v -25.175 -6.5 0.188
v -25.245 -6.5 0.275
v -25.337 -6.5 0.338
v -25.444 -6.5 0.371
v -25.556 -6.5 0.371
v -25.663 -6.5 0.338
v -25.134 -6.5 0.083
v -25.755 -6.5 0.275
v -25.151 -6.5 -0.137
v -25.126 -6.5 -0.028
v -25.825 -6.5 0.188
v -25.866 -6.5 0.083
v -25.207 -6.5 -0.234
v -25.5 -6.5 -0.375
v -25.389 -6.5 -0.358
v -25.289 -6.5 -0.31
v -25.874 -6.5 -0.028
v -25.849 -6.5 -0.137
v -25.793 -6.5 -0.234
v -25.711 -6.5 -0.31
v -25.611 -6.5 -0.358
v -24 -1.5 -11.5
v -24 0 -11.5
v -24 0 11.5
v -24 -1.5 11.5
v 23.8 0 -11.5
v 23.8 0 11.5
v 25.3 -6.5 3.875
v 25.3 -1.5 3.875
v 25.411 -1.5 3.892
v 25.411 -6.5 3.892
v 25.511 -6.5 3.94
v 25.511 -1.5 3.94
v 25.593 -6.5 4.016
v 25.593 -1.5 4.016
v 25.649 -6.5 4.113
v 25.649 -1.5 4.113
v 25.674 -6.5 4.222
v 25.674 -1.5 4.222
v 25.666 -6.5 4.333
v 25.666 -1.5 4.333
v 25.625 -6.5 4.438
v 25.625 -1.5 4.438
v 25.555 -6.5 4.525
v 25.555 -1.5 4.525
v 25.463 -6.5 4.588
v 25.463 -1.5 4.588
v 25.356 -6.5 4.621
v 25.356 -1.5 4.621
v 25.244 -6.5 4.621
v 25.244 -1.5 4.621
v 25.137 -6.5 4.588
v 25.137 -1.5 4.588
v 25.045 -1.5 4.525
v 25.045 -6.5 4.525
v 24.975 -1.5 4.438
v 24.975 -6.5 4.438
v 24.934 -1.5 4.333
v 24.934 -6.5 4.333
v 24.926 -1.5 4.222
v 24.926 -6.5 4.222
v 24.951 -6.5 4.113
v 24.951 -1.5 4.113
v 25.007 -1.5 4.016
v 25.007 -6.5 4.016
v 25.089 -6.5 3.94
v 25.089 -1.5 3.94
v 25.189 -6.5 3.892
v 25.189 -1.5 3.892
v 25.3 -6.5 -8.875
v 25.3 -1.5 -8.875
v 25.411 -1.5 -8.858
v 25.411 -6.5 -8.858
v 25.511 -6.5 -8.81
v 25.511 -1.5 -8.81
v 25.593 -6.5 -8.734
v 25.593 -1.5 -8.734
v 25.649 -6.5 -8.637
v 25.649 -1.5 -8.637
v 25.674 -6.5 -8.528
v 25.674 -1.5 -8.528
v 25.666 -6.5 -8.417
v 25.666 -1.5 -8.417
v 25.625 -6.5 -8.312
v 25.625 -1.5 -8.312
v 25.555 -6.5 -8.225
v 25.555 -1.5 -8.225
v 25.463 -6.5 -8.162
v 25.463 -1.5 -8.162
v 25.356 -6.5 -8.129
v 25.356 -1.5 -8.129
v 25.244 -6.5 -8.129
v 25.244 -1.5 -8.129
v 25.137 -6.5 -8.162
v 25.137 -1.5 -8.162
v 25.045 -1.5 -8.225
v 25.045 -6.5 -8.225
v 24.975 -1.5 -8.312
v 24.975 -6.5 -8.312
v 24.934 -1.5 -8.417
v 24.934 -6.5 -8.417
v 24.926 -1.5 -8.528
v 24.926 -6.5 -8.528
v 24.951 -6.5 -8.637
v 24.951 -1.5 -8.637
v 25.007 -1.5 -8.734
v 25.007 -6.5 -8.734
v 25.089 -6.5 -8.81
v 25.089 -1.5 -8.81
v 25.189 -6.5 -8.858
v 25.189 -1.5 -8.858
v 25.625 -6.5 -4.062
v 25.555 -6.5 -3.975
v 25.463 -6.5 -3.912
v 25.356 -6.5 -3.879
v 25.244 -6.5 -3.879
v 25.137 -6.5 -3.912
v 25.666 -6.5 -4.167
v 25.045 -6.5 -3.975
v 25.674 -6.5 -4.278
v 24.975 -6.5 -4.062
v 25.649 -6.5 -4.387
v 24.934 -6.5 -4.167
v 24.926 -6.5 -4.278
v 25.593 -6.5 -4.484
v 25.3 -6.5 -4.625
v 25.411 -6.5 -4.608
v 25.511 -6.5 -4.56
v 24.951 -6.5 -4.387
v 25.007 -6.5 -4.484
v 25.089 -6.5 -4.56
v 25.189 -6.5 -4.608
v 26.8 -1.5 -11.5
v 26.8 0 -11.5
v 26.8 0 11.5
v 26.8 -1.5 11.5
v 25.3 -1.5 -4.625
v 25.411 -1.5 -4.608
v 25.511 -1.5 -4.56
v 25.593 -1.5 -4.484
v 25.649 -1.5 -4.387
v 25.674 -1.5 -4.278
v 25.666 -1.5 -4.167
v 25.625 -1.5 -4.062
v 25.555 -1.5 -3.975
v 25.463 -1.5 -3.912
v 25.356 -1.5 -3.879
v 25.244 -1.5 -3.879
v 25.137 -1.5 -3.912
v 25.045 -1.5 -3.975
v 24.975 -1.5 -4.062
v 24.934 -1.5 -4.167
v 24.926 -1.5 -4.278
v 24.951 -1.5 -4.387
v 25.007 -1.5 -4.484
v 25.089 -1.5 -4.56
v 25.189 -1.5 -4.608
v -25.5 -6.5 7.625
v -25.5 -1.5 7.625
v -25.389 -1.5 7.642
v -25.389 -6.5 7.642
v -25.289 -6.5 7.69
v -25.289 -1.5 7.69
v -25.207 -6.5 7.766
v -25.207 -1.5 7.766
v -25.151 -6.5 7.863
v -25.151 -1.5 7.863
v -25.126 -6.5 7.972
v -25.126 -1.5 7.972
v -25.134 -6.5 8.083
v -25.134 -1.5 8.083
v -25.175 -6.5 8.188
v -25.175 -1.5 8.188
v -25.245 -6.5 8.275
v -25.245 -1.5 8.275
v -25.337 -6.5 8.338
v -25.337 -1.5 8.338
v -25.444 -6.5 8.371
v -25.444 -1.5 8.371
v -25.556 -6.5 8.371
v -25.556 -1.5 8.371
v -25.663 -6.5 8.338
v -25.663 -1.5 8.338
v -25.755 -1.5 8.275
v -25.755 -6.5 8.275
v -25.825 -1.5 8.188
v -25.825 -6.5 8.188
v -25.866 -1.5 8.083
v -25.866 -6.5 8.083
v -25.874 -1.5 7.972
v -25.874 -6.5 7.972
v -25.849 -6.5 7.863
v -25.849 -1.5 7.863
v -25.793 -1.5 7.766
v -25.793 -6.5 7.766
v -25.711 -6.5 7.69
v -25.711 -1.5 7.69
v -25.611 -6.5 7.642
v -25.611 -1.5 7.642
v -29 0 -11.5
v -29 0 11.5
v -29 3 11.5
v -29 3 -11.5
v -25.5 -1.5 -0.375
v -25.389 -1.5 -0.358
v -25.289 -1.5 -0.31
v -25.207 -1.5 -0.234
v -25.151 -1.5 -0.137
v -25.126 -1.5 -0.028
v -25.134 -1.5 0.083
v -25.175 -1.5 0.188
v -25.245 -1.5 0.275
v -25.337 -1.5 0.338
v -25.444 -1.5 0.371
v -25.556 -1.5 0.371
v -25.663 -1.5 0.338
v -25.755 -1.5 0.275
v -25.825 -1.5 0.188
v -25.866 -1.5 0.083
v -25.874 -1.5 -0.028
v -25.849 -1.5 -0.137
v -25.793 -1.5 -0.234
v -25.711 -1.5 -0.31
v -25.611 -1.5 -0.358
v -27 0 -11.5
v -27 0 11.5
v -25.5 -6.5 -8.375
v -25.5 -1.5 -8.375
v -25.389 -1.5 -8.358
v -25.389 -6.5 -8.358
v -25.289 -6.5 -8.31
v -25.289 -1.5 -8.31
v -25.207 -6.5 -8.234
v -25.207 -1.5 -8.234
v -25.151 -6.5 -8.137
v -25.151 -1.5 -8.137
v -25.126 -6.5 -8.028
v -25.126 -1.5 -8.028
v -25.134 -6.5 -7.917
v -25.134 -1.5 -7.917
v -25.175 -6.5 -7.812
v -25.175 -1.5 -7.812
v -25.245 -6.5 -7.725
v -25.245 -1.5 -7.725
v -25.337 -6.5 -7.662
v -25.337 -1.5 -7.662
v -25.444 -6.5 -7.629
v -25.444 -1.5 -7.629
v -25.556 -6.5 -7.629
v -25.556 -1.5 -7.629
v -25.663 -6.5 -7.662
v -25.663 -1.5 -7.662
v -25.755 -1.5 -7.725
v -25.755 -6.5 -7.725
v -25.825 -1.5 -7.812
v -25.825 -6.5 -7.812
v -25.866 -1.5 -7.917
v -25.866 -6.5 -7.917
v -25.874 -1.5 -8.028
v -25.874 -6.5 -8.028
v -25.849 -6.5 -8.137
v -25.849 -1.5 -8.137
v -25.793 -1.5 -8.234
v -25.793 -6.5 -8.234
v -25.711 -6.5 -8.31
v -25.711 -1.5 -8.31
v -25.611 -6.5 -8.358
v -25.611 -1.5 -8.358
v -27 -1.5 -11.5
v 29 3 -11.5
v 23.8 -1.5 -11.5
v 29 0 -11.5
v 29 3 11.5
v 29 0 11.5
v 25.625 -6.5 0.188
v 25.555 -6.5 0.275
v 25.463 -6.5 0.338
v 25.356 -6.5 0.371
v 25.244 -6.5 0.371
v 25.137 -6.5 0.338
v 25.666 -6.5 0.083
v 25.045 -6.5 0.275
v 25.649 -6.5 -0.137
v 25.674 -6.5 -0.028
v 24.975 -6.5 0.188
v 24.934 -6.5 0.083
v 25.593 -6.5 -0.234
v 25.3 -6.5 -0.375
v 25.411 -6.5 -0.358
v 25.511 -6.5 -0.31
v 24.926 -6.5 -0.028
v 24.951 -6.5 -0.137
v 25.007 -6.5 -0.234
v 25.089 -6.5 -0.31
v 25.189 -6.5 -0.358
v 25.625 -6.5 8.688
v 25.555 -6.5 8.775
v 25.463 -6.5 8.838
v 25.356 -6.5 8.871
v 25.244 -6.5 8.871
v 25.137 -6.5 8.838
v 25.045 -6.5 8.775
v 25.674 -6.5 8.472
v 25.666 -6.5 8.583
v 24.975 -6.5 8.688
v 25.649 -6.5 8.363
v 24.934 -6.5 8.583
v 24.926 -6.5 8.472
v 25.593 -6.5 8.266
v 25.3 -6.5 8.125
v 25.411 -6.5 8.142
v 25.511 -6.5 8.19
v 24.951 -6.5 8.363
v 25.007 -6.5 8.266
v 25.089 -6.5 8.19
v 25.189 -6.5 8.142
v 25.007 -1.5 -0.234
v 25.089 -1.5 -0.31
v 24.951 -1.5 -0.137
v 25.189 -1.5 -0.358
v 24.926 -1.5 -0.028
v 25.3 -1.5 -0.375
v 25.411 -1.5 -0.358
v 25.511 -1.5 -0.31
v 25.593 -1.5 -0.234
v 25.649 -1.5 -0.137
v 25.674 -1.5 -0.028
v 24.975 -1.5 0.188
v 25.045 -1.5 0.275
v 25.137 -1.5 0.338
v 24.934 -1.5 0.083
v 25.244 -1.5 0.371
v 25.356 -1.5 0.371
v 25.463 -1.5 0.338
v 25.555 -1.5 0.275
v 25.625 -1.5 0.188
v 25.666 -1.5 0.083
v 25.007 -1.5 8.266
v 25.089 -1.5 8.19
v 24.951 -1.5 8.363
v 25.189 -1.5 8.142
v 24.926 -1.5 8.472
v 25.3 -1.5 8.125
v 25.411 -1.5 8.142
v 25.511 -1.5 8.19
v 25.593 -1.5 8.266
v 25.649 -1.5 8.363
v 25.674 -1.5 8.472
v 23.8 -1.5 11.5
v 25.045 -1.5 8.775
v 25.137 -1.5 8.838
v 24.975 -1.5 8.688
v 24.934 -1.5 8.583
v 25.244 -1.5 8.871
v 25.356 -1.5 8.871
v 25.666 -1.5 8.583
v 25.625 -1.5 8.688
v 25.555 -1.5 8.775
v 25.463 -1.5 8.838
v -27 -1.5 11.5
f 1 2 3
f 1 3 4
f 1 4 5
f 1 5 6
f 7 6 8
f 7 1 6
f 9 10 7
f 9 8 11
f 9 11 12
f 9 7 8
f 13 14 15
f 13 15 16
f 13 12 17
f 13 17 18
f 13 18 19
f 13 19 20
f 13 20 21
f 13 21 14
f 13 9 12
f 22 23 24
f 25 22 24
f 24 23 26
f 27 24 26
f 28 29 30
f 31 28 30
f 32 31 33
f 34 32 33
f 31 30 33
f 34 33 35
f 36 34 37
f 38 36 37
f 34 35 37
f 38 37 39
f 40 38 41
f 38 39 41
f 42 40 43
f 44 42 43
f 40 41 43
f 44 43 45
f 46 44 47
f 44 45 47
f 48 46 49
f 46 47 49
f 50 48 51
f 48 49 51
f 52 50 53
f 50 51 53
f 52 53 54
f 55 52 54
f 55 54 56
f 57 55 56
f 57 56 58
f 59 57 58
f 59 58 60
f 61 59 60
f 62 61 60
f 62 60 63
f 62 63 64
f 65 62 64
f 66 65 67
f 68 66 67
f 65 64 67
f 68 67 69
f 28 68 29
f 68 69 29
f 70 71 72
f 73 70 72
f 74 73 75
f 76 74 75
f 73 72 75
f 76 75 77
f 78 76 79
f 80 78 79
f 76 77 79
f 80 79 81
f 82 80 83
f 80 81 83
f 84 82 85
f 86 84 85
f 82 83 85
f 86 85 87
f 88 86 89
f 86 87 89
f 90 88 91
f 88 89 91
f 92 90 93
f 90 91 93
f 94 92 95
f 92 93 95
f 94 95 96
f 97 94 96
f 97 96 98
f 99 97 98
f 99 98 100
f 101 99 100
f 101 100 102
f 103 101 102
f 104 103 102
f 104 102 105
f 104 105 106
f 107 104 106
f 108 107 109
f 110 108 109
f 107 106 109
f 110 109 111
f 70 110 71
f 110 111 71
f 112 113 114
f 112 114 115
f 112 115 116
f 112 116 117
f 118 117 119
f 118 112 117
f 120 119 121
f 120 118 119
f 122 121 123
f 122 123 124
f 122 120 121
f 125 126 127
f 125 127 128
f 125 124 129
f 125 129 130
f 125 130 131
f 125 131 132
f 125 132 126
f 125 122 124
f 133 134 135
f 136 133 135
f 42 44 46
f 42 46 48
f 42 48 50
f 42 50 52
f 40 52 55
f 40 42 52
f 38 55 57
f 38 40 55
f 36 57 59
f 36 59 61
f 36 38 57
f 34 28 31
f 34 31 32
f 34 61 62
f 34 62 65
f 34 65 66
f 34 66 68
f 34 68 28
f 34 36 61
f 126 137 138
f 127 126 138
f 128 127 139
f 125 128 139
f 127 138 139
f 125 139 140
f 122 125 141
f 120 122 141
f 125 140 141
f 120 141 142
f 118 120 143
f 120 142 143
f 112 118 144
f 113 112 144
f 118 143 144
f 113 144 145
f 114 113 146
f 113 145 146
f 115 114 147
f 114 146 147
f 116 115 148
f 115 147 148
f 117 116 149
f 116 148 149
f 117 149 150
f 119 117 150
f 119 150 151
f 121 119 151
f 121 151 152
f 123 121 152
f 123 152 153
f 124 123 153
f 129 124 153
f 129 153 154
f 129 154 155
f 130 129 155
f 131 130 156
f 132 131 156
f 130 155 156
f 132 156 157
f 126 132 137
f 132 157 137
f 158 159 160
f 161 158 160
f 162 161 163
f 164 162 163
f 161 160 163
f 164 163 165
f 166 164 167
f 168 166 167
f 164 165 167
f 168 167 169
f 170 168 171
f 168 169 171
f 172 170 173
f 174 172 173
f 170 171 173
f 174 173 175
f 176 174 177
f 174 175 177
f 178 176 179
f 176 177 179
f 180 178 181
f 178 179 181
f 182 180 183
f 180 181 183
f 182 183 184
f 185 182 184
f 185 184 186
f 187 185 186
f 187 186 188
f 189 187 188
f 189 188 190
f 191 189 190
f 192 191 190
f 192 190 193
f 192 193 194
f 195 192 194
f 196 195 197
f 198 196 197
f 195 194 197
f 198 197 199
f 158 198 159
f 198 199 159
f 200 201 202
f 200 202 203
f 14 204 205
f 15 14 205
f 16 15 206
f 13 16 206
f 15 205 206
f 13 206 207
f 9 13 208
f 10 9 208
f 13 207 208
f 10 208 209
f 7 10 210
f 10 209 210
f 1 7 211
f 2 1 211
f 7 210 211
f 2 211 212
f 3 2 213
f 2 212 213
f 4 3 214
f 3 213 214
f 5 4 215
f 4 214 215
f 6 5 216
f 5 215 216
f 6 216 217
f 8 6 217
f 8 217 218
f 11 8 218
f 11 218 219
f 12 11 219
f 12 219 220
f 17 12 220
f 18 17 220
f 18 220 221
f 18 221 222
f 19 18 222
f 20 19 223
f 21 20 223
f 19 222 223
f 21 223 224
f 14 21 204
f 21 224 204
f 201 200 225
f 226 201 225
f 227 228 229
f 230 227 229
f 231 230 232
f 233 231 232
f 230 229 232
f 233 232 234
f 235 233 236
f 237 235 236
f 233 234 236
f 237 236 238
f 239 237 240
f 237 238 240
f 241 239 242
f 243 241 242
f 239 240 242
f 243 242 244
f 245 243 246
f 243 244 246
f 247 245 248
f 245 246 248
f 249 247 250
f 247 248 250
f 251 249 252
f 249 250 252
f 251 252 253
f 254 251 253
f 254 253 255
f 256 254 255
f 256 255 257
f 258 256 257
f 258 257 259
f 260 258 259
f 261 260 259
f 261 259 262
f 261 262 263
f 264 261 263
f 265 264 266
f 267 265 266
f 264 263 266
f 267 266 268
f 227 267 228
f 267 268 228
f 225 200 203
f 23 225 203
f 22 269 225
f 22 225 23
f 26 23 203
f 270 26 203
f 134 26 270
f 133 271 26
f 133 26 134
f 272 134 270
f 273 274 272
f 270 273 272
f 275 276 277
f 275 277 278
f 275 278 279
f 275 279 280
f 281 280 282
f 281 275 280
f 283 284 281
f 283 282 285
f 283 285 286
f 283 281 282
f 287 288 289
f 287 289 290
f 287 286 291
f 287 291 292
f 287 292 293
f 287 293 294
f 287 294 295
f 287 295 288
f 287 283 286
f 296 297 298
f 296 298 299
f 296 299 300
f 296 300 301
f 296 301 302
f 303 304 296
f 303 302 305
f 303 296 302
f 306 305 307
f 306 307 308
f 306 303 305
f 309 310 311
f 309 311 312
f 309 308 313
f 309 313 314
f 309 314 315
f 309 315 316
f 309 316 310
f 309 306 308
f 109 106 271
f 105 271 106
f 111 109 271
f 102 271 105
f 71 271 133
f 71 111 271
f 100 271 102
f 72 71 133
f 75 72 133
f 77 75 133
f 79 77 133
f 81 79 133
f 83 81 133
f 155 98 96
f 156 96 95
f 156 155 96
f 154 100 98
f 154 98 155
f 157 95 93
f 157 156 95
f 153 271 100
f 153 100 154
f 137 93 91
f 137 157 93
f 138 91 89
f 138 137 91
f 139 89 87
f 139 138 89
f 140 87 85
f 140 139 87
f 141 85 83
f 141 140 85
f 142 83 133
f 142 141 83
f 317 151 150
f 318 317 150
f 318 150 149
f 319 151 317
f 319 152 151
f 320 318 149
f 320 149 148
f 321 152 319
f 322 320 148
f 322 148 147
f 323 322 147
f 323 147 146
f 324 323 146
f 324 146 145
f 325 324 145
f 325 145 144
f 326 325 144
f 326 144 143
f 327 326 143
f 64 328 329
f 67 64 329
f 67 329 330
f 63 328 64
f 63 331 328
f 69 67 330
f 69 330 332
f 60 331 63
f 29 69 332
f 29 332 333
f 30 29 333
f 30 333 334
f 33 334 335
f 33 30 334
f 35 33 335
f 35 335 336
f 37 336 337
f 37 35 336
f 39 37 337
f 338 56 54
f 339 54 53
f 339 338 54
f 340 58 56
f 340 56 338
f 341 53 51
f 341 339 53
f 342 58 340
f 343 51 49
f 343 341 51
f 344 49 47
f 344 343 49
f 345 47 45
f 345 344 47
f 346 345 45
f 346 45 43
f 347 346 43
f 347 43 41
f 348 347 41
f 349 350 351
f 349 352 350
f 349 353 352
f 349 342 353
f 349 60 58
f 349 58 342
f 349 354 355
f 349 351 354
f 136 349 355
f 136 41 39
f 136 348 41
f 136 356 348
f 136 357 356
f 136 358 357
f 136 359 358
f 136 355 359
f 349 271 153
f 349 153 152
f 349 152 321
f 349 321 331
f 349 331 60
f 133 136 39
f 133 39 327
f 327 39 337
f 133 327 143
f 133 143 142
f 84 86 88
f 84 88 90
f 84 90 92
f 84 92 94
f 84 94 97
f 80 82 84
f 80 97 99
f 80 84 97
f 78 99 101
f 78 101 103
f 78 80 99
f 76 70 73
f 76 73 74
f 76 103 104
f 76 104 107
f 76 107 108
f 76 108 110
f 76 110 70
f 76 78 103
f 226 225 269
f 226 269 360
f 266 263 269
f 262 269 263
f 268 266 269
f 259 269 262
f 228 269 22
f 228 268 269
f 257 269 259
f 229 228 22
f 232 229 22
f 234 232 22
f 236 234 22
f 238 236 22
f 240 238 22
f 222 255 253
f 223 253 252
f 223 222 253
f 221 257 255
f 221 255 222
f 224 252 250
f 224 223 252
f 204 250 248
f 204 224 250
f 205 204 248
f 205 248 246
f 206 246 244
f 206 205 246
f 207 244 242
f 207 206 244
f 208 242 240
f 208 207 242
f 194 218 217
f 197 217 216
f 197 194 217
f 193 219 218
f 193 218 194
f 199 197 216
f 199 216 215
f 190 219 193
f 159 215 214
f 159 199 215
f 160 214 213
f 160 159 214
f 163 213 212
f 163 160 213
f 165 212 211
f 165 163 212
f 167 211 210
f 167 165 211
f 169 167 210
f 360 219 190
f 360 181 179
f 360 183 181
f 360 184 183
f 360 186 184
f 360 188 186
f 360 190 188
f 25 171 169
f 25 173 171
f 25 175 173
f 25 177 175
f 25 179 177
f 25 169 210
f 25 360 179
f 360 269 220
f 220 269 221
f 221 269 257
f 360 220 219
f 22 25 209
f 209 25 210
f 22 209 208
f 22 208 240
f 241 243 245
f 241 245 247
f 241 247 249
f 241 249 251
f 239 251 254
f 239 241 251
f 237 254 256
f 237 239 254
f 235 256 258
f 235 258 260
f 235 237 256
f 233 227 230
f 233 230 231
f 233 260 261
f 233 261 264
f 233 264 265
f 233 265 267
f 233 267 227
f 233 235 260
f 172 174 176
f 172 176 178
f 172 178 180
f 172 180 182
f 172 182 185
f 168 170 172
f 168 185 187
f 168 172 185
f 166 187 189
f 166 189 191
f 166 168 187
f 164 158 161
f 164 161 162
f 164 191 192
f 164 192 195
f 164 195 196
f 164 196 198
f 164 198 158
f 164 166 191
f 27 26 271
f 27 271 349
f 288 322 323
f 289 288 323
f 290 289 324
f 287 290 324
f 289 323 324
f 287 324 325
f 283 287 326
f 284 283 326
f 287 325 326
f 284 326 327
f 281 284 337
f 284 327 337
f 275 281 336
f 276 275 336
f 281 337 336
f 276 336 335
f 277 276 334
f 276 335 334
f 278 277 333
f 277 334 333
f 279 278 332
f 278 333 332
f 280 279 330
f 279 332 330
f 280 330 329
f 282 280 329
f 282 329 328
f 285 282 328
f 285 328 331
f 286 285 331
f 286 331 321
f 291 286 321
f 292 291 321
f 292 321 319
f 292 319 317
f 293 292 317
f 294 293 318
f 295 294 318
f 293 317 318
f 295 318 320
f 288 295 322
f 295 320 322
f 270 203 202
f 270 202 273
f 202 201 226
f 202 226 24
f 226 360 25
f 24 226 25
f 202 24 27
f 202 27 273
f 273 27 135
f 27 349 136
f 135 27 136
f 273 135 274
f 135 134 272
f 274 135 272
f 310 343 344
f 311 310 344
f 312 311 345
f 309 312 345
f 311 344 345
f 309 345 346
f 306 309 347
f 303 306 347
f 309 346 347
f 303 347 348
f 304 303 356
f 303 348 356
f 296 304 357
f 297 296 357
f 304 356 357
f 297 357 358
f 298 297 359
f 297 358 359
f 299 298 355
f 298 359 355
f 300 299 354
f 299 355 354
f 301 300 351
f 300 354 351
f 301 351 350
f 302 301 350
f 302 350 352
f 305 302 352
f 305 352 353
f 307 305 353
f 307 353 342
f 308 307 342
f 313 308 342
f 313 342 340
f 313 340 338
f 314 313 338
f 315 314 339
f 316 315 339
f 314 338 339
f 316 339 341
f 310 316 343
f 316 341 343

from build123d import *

# Parameters (mm, degrees)
SKETCH1_W           = 58
SKETCH1_H           = 23
BOSS_EXTRUDE1_DEPTH = 3
SKETCH2_W           = 3
SKETCH2_H           = 23
BOSS_EXTRUDE2_DEPTH = 1.5
SKETCH3_R           = 0.375
BOSS_EXTRUDE3_DEPTH = 5
LPATTERN1_COUNT     = 2
LPATTERN1_PITCH     = 50.8
SKETCH4_R           = 0.375
BOSS_EXTRUDE4_DEPTH = 5


with BuildPart() as part:
    # Sketch1 → Boss-Extrude1 (new body)
    with BuildSketch(Plane(origin=(0, 0, 0), x_dir=(1, 0, 0), z_dir=(0, 1, 0))):
        Rectangle(SKETCH1_W, SKETCH1_H)
    extrude(amount=BOSS_EXTRUDE1_DEPTH)

    # Sketch2 → Boss-Extrude2 (add)
    with BuildSketch(Plane.XZ):
        with Locations((-25.5, 0)):
            Rectangle(SKETCH2_W, SKETCH2_H)
    boss_extrude2 = extrude(amount=BOSS_EXTRUDE2_DEPTH)

    # Sketch3 → Boss-Extrude3 (add)
    with BuildSketch(Plane.XZ.offset(1.5)):
        with Locations(Location((-25.5, 8, 0), (0, 0, 270))):
            Circle(SKETCH3_R)
        with Locations(Location((-25.5, 0, 0), (0, 0, 270))):
            Circle(SKETCH3_R)
        with Locations(Location((-25.5, -8, 0), (0, 0, 270))):
            Circle(SKETCH3_R)
    extrude(amount=BOSS_EXTRUDE3_DEPTH)

    # LPattern1: Boss-Extrude2 ×2
    with Locations(*[(i * LPATTERN1_PITCH, 0, 0) for i in range(1, LPATTERN1_COUNT)]):
        add(boss_extrude2)

    # Sketch4 → Boss-Extrude4 (add)
    with BuildSketch(Plane.XZ.offset(1.5)):
        with Locations(Location((25.3, 8.5, 0), (0, 0, 270))):
            Circle(SKETCH4_R)
        with Locations(Location((25.3, 4.25, 0), (0, 0, 270))):
            Circle(SKETCH4_R)
        with Locations(Location((25.3, 0, 0), (0, 0, 270))):
            Circle(SKETCH4_R)
        with Locations(Location((25.3, -4.25, 0), (0, 0, 270))):
            Circle(SKETCH4_R)
        with Locations(Location((25.3, -8.5, 0), (0, 0, 270))):
            Circle(SKETCH4_R)
    extrude(amount=BOSS_EXTRUDE4_DEPTH)


solid = part.part
